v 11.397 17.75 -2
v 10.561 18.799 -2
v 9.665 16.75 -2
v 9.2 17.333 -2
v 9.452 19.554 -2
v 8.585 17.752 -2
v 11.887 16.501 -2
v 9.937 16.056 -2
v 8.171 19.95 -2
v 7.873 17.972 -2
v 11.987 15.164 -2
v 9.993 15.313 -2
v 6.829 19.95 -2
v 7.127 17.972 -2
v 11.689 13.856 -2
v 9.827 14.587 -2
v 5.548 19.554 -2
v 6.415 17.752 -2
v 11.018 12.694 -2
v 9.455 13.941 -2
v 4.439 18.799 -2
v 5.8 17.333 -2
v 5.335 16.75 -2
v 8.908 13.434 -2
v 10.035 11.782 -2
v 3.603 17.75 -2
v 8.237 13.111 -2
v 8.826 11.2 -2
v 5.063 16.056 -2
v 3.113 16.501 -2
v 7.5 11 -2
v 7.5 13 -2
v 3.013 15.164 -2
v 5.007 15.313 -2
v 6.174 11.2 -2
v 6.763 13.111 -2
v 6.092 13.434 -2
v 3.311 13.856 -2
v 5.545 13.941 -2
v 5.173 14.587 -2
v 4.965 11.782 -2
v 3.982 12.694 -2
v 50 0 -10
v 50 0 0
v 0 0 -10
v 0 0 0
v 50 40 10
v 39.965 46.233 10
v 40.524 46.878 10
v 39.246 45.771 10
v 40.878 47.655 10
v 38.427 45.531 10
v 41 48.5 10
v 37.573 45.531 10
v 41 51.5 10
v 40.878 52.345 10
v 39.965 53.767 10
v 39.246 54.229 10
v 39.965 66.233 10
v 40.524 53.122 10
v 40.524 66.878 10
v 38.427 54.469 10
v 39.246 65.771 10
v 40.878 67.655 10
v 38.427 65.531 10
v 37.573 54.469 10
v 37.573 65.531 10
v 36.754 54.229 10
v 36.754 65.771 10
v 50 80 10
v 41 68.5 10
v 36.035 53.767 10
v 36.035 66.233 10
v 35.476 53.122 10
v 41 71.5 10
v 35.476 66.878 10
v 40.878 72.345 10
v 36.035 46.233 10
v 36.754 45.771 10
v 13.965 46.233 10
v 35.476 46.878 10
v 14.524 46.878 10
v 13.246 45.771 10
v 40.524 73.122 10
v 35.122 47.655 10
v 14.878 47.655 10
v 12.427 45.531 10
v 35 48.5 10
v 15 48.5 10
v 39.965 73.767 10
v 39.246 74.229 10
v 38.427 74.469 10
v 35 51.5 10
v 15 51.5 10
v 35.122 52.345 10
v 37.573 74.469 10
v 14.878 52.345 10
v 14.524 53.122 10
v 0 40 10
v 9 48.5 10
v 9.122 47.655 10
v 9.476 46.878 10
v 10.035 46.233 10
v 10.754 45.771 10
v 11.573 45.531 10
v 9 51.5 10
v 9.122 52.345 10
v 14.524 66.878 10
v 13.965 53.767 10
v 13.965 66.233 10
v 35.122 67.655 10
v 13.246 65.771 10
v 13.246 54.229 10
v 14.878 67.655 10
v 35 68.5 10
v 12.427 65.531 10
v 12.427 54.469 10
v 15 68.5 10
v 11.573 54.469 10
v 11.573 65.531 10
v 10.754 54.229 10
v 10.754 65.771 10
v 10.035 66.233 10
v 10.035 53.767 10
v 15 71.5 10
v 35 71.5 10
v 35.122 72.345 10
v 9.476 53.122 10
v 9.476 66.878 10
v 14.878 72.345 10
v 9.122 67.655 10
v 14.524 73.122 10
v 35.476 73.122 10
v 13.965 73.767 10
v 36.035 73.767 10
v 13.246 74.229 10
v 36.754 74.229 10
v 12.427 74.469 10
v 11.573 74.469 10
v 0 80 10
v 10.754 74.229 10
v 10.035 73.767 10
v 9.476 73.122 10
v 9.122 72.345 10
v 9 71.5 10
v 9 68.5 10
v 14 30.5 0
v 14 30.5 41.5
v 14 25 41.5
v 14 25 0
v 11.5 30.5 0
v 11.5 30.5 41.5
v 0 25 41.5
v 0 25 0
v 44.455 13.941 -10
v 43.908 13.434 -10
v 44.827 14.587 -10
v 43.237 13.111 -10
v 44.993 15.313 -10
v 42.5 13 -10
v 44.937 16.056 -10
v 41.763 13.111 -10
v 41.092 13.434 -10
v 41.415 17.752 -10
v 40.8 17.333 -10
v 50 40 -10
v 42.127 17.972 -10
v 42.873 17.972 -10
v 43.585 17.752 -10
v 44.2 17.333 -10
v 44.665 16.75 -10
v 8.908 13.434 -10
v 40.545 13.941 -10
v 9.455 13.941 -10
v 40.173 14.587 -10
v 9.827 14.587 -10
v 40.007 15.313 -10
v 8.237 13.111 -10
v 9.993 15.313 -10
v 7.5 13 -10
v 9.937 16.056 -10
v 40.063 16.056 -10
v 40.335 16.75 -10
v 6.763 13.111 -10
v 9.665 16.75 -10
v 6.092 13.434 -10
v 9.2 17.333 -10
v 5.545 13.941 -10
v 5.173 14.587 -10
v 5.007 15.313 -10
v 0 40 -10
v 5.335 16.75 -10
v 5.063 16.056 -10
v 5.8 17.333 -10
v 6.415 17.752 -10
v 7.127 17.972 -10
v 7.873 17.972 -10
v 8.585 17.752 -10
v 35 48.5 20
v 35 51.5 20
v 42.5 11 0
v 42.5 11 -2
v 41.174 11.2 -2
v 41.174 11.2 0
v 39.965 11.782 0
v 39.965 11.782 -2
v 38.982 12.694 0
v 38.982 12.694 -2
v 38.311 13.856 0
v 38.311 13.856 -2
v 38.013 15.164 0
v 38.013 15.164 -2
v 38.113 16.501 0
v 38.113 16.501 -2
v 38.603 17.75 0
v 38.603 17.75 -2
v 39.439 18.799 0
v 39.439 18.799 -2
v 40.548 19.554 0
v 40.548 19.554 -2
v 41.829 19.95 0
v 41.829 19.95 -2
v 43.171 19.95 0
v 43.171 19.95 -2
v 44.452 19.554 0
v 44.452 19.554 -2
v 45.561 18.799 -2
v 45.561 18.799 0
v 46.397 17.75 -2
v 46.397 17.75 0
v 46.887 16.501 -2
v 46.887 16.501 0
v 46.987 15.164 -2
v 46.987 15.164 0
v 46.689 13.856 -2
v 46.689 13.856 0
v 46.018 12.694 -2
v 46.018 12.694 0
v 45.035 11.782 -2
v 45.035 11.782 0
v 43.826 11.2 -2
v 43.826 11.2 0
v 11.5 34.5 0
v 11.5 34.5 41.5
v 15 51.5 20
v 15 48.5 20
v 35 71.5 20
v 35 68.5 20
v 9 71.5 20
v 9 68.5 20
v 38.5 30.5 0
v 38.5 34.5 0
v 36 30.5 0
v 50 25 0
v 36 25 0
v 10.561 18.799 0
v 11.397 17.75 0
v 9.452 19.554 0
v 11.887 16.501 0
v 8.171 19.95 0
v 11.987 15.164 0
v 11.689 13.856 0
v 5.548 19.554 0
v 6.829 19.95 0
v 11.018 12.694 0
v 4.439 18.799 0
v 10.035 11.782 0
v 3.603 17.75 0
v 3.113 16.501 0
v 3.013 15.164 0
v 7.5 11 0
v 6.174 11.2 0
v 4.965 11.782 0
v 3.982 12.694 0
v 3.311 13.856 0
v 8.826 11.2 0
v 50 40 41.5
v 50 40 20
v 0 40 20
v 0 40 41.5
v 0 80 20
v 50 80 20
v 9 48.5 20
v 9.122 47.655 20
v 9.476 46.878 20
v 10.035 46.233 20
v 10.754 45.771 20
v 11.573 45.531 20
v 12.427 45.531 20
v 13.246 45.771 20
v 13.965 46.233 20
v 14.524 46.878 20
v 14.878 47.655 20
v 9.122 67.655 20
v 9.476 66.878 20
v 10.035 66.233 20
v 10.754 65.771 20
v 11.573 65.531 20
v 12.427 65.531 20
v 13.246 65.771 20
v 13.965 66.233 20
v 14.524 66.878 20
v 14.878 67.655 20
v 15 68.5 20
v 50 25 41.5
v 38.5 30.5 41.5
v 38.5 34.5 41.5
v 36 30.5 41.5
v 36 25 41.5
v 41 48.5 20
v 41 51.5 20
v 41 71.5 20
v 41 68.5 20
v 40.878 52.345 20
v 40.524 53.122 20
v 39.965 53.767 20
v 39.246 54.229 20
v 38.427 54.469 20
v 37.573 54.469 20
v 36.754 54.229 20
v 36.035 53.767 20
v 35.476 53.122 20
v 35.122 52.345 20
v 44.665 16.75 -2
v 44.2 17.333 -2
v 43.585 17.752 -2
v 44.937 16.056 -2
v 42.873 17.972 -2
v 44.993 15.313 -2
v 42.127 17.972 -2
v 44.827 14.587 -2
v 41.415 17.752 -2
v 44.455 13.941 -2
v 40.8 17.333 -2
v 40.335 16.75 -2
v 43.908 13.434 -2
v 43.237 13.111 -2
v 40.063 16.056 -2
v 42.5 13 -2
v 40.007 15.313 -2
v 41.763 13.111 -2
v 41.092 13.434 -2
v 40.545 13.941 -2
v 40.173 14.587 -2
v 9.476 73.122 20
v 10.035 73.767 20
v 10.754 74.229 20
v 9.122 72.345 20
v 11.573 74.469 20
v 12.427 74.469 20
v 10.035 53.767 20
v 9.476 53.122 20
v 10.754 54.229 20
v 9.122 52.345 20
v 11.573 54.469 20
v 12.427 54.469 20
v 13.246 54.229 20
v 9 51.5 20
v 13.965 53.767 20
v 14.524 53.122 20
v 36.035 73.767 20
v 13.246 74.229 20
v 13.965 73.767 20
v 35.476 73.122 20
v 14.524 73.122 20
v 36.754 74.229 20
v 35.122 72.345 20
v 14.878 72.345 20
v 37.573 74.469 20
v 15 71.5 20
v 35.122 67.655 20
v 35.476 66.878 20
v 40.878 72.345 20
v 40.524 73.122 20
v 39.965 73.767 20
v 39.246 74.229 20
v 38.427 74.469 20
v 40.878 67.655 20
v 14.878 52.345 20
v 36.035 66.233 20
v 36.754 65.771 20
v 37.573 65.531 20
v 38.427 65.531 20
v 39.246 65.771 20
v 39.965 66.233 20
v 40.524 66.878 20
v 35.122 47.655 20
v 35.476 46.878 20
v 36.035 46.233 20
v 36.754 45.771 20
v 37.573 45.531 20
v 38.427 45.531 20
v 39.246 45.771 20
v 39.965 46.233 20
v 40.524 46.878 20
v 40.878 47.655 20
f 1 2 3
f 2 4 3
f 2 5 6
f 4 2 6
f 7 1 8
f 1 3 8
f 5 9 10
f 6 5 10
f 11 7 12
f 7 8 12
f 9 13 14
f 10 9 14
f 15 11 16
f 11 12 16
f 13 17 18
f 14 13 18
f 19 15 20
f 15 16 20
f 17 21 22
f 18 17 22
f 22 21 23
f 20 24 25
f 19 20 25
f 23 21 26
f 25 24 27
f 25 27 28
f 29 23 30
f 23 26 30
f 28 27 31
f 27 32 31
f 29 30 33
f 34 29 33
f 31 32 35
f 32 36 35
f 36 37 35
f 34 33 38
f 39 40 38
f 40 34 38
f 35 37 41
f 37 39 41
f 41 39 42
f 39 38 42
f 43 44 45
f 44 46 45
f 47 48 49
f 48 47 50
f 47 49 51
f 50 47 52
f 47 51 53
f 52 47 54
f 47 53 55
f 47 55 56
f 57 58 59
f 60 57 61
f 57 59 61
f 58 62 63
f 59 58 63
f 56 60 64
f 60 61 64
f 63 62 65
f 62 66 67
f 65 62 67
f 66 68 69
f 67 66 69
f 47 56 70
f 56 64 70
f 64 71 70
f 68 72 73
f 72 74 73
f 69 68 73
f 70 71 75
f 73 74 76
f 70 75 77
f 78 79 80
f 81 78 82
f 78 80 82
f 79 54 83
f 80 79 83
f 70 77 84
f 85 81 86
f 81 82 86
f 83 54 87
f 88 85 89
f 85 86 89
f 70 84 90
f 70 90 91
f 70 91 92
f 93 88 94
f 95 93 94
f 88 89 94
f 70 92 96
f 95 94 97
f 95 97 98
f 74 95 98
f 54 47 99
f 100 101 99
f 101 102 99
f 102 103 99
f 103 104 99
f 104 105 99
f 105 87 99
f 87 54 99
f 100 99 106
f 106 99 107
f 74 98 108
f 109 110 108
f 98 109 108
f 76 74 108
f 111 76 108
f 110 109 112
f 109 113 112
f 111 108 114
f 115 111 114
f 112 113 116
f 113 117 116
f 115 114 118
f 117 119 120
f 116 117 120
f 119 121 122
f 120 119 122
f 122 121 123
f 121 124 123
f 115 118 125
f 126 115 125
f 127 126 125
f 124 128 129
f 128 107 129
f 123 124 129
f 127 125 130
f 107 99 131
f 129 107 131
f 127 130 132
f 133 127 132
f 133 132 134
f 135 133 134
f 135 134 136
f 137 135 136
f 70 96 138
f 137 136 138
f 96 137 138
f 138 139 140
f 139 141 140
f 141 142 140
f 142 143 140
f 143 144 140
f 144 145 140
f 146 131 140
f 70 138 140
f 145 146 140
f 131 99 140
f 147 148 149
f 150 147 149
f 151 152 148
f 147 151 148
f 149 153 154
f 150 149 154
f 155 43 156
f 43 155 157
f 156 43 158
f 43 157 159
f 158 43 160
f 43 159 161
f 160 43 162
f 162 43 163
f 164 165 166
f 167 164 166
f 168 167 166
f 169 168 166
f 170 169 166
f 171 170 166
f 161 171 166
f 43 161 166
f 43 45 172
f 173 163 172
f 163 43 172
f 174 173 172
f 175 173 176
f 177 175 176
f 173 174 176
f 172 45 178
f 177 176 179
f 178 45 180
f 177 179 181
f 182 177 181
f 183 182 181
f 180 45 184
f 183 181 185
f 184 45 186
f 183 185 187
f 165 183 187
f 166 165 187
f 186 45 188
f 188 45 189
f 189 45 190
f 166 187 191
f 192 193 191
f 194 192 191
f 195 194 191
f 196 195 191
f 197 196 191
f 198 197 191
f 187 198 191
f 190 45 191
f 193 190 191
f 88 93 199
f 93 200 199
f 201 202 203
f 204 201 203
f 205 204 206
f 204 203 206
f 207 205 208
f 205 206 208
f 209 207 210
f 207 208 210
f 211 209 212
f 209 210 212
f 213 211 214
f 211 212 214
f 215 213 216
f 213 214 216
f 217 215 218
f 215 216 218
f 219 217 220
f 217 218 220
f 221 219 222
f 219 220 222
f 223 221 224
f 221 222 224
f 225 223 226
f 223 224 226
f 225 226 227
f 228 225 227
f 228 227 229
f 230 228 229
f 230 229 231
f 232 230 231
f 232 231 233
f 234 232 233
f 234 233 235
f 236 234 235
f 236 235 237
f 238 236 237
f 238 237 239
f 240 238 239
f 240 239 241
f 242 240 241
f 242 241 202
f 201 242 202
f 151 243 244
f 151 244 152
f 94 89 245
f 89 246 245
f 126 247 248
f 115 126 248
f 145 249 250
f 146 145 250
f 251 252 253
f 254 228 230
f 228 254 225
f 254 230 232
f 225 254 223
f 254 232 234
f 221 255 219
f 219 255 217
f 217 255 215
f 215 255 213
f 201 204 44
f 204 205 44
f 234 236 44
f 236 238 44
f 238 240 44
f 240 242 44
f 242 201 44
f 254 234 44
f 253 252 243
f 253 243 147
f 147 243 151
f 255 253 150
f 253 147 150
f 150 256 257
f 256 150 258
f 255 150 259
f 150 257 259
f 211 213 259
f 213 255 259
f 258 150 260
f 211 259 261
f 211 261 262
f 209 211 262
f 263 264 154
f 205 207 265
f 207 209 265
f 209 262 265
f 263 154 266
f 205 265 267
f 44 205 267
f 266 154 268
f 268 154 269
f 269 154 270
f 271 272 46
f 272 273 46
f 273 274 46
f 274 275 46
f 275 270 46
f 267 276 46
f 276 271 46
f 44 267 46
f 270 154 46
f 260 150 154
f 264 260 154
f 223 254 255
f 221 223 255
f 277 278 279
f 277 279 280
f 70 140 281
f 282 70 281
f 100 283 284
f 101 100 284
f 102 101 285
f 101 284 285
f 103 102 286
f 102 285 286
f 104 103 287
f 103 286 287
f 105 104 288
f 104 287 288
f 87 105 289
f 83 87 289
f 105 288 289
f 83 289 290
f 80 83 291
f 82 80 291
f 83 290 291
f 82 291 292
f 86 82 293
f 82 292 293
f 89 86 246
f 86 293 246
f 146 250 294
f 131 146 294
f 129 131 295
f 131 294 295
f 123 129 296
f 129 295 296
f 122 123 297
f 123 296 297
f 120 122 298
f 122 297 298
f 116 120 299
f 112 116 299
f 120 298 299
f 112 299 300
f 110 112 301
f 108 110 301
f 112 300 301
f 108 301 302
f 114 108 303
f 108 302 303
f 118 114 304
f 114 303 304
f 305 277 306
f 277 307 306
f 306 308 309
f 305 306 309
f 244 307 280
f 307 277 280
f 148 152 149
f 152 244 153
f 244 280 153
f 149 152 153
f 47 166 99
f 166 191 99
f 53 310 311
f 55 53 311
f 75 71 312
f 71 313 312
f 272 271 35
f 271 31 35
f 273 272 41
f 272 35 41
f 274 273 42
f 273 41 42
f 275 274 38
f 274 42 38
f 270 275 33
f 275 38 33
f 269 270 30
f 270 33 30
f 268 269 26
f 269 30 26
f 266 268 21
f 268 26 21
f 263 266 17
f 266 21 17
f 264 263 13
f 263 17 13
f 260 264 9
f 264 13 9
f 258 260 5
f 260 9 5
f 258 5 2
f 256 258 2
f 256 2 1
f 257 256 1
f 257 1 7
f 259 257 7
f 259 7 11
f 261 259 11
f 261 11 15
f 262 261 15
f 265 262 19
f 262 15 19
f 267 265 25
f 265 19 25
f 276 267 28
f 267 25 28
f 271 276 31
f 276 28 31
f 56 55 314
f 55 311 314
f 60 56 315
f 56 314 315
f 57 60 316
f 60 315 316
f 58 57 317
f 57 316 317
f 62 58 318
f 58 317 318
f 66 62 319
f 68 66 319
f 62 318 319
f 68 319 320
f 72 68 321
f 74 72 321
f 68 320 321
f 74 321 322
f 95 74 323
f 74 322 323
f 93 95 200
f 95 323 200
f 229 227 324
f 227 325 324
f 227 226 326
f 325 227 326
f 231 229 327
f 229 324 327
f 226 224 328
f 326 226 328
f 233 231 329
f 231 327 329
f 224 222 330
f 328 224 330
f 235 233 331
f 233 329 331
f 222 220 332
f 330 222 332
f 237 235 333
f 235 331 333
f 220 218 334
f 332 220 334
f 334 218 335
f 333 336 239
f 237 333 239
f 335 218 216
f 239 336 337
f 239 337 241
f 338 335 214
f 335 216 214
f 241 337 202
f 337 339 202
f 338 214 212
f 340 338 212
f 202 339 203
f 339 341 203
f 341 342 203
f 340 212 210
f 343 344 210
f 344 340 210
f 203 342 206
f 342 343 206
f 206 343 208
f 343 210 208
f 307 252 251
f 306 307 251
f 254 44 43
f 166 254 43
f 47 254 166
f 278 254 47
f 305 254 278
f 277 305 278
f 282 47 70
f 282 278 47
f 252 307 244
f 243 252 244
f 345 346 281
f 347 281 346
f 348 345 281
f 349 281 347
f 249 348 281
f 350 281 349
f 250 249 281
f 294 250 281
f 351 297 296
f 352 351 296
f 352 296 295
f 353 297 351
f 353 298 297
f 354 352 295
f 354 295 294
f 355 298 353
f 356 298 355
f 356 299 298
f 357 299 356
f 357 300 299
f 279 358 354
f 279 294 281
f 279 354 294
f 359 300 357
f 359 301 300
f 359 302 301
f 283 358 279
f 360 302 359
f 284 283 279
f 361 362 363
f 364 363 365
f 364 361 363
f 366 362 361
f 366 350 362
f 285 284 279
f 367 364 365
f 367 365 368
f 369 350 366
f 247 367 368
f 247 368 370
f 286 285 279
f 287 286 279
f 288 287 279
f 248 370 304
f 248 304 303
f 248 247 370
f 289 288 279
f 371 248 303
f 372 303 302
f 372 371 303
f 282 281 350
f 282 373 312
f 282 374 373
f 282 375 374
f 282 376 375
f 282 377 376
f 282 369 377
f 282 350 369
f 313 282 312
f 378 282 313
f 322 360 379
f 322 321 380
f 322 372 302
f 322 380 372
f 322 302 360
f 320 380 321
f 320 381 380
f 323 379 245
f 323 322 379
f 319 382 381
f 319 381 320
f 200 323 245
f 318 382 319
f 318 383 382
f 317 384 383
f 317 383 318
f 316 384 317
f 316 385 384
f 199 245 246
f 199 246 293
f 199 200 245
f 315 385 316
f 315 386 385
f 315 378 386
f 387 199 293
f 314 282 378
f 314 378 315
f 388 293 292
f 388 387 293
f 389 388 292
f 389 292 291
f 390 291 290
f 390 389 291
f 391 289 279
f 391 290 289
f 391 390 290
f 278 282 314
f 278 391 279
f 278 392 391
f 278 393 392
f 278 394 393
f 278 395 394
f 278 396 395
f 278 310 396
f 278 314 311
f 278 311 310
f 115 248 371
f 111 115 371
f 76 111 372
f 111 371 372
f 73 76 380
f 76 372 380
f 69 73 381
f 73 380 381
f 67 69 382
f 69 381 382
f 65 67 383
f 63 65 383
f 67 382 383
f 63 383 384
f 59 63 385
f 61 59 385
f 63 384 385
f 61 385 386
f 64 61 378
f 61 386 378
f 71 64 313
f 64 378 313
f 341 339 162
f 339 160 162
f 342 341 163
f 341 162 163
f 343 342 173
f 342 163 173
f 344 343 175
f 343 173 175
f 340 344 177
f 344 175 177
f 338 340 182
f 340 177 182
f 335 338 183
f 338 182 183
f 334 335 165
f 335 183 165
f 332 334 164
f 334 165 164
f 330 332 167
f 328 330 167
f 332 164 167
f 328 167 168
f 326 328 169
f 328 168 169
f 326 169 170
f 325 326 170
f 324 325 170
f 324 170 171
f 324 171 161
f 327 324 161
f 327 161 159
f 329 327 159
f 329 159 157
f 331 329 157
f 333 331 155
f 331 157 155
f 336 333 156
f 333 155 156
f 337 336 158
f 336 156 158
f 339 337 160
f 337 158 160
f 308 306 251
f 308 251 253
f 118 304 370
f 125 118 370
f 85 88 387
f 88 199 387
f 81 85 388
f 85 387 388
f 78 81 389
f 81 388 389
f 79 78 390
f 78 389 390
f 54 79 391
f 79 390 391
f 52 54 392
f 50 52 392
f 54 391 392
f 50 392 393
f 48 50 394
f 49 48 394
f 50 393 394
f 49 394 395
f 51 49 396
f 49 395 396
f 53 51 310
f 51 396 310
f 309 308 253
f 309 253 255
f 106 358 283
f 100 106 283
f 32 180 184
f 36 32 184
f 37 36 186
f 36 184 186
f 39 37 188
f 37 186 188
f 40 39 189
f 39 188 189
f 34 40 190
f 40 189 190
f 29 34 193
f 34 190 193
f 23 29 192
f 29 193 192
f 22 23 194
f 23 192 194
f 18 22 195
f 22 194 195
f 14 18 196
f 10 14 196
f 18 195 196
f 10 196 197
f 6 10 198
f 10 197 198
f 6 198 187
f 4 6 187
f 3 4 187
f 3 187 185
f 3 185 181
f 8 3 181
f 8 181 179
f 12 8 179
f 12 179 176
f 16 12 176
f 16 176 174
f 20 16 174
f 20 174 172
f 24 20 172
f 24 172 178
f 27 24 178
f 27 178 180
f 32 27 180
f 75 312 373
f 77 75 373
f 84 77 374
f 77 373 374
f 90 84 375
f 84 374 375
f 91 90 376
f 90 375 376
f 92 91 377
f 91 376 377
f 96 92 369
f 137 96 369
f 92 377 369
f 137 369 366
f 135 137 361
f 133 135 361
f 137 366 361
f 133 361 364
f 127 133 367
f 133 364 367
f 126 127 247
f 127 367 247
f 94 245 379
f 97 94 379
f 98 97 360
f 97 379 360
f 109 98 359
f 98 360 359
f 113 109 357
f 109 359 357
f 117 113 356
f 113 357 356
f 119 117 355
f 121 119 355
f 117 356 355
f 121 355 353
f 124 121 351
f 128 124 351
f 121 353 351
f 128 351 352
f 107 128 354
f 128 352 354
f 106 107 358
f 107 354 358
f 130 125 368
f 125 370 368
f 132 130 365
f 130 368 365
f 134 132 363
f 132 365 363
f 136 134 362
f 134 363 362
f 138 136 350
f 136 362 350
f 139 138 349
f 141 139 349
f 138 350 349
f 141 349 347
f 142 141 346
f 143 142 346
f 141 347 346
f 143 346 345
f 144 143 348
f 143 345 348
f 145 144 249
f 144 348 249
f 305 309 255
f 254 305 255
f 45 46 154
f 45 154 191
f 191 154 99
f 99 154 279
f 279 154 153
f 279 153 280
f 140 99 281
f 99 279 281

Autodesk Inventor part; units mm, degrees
ref_plane "YZ Plane" through (0, 0, 0) normal (1, 0, 0) x (0, 1, 0)
ref_plane "XZ Plane" through (0, 0, 0) normal (0, 1, 0) x (-1, 0, 0)
sketch "Sketch1" plane through (0, 0, 0) normal (1, 0, 0) x (0, 1, 0)
  line L0 (80, 41.5) -> (25, 41.5)
  line L1 (25, 41.5) -> (25, -10)
  line L2 (25, -10) -> (80, -10)
  line L3 (80, -10) -> (80, 41.5)
  line L4 (25, 0) -> (0, 0)
  line L5 (0, 0) -> (0, -10)
  line L6 (0, -10) -> (25, -10)
  line L7 (25, -10) -> (25, 0)
  line L8 (40, 10) -> (80, 10)
  line L9 (80, 10) -> (80, -10)
  line L10 (80, -10) -> (40, -10)
  line L11 (40, -10) -> (40, 10)
  point P0 (25, -10)
  dimension "d0" = 55
  dimension "d1" = 10
  dimension "d3" = 51.5
  dimension "d135" = 25
  dimension "d144" = 20
  dimension "d145" = 40
extrude "Extrusion1" add sketch "Sketch1" along normal blind 50 contours L3 L8 L11 L2 L1 L0 | L1 L6 L5 L4
ref_plane "Work Plane1" through (0, 25, 8.75) normal (0, 0, 1) x (1, 0, 0)
sketch "Sketch23" plane through (0, 25, 41.5) normal (0, 0, 1) x (1, 0, 0)
  line L0 (38.5, 9.5) -> (11.5, 9.5)
  line L1 (0, 0) -> (50, 0) projected
  line L2 (38.5, 9.5) -> (38.5, 5.5)
  line L3 (38.5, 5.5) -> (36, 5.5)
  line L4 (36, 5.5) -> (36, 0)
  line L5 (0, 0) -> (50, 0) projected
  line L6 (11.5, 9.5) -> (11.5, 5.5)
  line L7 (11.5, 5.5) -> (14, 5.5)
  line L8 (14, 5.5) -> (14, 0)
  point P0 (0, -25)
  point P1 (25, 9.5)
  point P2 (25, 0)
  point P3 (14, 0)
  point P4 (36, 0)
  dimension "d149" = 9.5
  dimension "d150" = 4
  dimension "d151" = 2.5
  dimension "d152" = 27
extrude "Extrusion16" cut sketch "Sketch23" against normal up to surface (41.5 mm away)
sketch "Sketch24" plane through (50, 0, 0) normal (1, 0, 0) x (0, 0, -1)
  line L0 (-20, 45) -> (-41.5, 45)
  line L1 (-41.5, 45) -> (-41.5, 80)
  line L2 (-41.5, 80) -> (-20, 80)
  line L3 (-20, 80) -> (-20, 45)
  line L4 (-10, 40) -> (-10, 80) projected
  line L5 (10, 40) -> (-10, 40) projected
  line L6 (-41.5, 80) -> (-41.5, 25) projected
  line L7 (-10, 80) -> (-41.5, 80) projected
  point P0 (0, 0)
  dimension "d155" = 10
  dimension "d156" = 5
extrude "Extrusion17" cut sketch "Sketch24" against normal through all
sketch "Sketch25" plane through (0, 0, 0) normal (0, 0, 1) x (1, 0, 0)
  circle A0 centre (7.5, 15.5) radius 2.5
  circle A1 centre (42.5, 15.5) radius 2.5
  line L0 (0, 0) -> (50, 0) projected
  line L1 (50, 25) -> (50, 0) projected
  dimension "d162" = 5
  dimension "d163" = 15.5
  dimension "d164" = 7.5
  dimension "d165" = 35
hole "Hole5" at (7.5, 15.5, 0) at (42.5, 15.5, 0) direction (0, 0, -1) diameter 5 end through all counterbore diameter 9 counterbore depth 2
move faces "Move6" translate (0, -5, 0) faces at (33.3333, 45, 34.3333)
sketch "Sketch26" plane through (0, 80, 20) normal (0, 0, 1) x (1, 0, 0)
  line L0 (38, -31.5) -> (38, -28.5) construction
  line L1 (41, -31.5) -> (41, -28.5)
  line L2 (35, -28.5) -> (35, -31.5)
  arc A0 (35, -31.5) -> (41, -31.5) centre (38, -31.5) ccw
  arc A1 (41, -28.5) -> (35, -28.5) centre (38, -28.5) ccw
  line L3 (12, -31.5) -> (12, -28.5) construction
  line L4 (15, -31.5) -> (15, -28.5)
  line L5 (9, -28.5) -> (9, -31.5)
  arc A2 (9, -31.5) -> (15, -31.5) centre (12, -31.5) ccw
  arc A3 (15, -28.5) -> (9, -28.5) centre (12, -28.5) ccw
  line L6 (38, -11.5) -> (38, -8.5) construction
  line L7 (41, -11.5) -> (41, -8.5)
  line L8 (35, -8.5) -> (35, -11.5)
  arc A4 (35, -11.5) -> (41, -11.5) centre (38, -11.5) ccw
  arc A5 (41, -8.5) -> (35, -8.5) centre (38, -8.5) ccw
  line L9 (12, -11.5) -> (12, -8.5) construction
  line L10 (15, -11.5) -> (15, -8.5)
  line L11 (9, -8.5) -> (9, -11.5)
  arc A6 (9, -11.5) -> (15, -11.5) centre (12, -11.5) ccw
  arc A7 (15, -8.5) -> (9, -8.5) centre (12, -8.5) ccw
  line L12 (50, 0) -> (50, -35) projected
  line L13 (0, -35) -> (0, 0) projected
  line L14 (0, 0) -> (50, 0) projected
  line L15 (50, -40) -> (0, -40) projected
  point P0 (0, -80)
  point P1 (38, -30)
  point P2 (12, -30)
  point P3 (38, -10)
  point P4 (12, -10)
  dimension "d173" = 3
  dimension "d174" = 6
  dimension "d176" = 12
  dimension "d177" = 12
  dimension "d178" = 10
  dimension "d185" = 10
extrude "Extrusion18" cut sketch "Sketch26" against normal through all
equation "\"d177\" = d176"
equation "\"d178\" = d175"
equation "\"d175\" = 10"
properties part number "10-03-029"
